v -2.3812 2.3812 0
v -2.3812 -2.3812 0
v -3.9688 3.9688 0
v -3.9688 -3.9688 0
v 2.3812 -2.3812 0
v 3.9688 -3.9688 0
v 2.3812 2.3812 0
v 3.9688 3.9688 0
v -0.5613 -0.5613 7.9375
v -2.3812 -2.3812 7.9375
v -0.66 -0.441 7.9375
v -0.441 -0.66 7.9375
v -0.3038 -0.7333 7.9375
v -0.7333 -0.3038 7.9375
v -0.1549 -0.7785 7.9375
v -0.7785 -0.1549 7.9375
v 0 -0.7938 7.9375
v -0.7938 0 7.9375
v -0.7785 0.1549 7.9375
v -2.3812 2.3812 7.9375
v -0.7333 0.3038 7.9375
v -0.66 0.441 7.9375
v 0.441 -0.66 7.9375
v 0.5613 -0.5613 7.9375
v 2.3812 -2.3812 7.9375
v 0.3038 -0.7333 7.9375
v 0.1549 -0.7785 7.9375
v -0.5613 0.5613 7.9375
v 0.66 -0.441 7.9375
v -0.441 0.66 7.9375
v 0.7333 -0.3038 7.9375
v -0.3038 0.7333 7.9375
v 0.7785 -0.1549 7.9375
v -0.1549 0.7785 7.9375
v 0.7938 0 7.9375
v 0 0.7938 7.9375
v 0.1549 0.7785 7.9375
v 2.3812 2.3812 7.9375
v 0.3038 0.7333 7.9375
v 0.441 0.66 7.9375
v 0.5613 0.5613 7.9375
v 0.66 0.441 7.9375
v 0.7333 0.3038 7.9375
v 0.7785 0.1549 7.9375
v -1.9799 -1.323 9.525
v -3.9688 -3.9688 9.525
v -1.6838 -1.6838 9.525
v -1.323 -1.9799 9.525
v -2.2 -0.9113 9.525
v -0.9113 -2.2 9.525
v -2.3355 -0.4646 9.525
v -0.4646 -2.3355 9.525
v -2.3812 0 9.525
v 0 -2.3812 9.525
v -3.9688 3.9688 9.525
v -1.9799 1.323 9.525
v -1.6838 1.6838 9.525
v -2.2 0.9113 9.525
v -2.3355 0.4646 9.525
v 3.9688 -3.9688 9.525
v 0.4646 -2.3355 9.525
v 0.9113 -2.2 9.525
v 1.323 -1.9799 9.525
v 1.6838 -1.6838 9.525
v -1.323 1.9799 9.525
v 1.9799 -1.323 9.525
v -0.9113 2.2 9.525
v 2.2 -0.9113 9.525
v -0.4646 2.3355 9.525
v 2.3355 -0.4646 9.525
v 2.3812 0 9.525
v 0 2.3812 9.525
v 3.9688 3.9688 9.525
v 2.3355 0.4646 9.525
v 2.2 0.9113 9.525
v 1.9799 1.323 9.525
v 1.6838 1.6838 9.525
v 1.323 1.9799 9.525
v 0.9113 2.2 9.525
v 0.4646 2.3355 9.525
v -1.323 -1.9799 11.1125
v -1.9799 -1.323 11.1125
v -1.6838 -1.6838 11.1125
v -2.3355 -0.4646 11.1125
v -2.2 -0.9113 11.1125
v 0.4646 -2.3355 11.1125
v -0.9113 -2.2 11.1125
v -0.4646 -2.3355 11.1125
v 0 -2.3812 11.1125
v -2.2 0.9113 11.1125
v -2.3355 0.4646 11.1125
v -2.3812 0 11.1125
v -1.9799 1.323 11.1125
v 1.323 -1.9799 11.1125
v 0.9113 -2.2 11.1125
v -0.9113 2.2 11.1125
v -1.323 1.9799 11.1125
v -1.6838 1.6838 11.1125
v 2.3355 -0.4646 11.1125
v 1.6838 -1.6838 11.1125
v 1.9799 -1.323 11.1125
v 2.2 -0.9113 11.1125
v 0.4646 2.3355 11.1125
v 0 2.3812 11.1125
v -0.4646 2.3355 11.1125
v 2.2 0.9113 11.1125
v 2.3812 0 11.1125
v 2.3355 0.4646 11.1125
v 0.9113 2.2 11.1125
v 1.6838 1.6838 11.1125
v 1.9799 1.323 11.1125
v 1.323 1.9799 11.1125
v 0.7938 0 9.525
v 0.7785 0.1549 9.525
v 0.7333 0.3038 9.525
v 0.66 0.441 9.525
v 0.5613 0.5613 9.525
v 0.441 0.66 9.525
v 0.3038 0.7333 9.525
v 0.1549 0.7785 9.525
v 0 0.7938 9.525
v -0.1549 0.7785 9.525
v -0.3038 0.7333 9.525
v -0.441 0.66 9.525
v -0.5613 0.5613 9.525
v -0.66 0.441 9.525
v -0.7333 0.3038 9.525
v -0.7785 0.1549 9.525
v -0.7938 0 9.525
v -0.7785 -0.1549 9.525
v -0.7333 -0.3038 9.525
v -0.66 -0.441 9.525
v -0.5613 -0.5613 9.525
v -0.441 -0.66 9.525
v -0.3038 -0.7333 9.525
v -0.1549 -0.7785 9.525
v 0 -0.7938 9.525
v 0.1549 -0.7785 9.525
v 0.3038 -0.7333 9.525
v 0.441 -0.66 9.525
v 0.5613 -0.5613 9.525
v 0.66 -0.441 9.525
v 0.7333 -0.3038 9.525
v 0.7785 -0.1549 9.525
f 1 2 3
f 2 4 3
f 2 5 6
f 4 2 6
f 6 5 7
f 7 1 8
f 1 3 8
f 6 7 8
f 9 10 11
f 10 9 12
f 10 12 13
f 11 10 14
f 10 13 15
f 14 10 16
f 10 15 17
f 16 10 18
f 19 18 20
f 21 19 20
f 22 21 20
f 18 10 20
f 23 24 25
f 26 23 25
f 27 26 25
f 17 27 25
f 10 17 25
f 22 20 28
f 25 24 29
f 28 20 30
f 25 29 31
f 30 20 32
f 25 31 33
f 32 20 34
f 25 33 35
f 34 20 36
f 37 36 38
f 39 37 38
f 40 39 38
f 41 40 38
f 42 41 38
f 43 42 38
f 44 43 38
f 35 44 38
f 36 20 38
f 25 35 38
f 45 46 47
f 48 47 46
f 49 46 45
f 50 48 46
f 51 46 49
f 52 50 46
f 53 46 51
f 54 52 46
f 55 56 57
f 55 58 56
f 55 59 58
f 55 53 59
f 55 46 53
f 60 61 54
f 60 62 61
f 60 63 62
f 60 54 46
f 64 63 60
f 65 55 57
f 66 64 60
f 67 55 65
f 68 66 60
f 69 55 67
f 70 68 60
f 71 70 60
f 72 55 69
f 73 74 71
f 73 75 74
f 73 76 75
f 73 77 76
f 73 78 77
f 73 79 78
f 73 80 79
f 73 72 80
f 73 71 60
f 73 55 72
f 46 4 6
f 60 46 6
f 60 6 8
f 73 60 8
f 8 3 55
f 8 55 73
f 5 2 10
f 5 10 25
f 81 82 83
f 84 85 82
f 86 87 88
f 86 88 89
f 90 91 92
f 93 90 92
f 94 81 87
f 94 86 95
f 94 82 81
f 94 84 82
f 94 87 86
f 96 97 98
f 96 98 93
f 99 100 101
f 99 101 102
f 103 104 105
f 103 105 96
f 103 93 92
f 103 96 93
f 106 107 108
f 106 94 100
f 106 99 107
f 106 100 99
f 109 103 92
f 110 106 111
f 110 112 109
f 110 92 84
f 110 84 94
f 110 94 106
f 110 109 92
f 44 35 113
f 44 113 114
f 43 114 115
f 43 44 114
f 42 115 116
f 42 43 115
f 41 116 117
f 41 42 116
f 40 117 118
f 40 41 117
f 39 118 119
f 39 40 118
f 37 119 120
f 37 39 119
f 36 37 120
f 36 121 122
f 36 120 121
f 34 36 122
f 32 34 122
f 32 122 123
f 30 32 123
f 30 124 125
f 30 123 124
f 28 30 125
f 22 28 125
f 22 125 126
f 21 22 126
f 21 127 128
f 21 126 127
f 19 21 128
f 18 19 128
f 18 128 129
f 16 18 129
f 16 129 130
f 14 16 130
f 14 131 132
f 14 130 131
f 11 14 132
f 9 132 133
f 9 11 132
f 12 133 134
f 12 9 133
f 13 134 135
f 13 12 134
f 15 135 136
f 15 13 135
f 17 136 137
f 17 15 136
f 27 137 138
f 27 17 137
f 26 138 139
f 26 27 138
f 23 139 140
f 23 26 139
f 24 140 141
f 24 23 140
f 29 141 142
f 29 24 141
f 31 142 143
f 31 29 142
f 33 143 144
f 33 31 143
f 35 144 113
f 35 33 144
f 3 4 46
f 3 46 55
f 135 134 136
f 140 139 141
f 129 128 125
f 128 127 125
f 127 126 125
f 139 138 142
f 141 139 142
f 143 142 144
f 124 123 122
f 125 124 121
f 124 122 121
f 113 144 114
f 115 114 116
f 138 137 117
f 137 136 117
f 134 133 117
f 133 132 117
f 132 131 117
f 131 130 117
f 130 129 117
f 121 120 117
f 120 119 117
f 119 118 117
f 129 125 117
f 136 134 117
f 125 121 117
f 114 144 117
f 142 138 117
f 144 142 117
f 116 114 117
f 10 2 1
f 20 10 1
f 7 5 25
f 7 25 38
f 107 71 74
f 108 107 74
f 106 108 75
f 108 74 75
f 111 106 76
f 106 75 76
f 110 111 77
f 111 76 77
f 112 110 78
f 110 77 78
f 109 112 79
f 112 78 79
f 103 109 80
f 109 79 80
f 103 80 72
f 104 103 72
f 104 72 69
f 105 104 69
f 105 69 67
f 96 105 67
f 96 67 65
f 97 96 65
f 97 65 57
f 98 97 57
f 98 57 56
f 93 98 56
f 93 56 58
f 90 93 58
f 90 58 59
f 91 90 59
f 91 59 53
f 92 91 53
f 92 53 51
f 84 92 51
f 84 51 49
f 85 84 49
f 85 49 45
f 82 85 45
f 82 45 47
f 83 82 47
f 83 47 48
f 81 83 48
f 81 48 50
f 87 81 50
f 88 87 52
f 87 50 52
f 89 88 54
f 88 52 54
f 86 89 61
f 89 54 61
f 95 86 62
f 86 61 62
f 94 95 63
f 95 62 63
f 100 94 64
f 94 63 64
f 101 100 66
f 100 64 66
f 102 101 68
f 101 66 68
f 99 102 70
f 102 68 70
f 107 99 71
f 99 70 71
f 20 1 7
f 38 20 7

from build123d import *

# Parameters (mm, degrees)
F0_W     = 7.9375
F0_H     = 7.9375
F0_R     = 2.38125
F1_DEPTH = 9.525
F2_DEPTH = 11.1125
F3_T     = -1.5875


with BuildPart() as f1:
    # F0 (on Top) → F1 (new body)
    with BuildSketch(Plane.XY):
        Rectangle(F0_W, F0_H)
        Circle(F0_R, mode=Mode.SUBTRACT)
    extrude(amount=F1_DEPTH)

    # F0 (on Top) → F2 (join)
    with BuildSketch(Plane.XY):
        Circle(F0_R)
    extrude(amount=F2_DEPTH)

    # F3
    f3_openings = [f1.faces().sort_by_distance(p)[0] for p in [
        (0, 0, 0),
    ]]
    offset(amount=F3_T, openings=f3_openings, kind=Kind.INTERSECTION)


solid = f1.part
